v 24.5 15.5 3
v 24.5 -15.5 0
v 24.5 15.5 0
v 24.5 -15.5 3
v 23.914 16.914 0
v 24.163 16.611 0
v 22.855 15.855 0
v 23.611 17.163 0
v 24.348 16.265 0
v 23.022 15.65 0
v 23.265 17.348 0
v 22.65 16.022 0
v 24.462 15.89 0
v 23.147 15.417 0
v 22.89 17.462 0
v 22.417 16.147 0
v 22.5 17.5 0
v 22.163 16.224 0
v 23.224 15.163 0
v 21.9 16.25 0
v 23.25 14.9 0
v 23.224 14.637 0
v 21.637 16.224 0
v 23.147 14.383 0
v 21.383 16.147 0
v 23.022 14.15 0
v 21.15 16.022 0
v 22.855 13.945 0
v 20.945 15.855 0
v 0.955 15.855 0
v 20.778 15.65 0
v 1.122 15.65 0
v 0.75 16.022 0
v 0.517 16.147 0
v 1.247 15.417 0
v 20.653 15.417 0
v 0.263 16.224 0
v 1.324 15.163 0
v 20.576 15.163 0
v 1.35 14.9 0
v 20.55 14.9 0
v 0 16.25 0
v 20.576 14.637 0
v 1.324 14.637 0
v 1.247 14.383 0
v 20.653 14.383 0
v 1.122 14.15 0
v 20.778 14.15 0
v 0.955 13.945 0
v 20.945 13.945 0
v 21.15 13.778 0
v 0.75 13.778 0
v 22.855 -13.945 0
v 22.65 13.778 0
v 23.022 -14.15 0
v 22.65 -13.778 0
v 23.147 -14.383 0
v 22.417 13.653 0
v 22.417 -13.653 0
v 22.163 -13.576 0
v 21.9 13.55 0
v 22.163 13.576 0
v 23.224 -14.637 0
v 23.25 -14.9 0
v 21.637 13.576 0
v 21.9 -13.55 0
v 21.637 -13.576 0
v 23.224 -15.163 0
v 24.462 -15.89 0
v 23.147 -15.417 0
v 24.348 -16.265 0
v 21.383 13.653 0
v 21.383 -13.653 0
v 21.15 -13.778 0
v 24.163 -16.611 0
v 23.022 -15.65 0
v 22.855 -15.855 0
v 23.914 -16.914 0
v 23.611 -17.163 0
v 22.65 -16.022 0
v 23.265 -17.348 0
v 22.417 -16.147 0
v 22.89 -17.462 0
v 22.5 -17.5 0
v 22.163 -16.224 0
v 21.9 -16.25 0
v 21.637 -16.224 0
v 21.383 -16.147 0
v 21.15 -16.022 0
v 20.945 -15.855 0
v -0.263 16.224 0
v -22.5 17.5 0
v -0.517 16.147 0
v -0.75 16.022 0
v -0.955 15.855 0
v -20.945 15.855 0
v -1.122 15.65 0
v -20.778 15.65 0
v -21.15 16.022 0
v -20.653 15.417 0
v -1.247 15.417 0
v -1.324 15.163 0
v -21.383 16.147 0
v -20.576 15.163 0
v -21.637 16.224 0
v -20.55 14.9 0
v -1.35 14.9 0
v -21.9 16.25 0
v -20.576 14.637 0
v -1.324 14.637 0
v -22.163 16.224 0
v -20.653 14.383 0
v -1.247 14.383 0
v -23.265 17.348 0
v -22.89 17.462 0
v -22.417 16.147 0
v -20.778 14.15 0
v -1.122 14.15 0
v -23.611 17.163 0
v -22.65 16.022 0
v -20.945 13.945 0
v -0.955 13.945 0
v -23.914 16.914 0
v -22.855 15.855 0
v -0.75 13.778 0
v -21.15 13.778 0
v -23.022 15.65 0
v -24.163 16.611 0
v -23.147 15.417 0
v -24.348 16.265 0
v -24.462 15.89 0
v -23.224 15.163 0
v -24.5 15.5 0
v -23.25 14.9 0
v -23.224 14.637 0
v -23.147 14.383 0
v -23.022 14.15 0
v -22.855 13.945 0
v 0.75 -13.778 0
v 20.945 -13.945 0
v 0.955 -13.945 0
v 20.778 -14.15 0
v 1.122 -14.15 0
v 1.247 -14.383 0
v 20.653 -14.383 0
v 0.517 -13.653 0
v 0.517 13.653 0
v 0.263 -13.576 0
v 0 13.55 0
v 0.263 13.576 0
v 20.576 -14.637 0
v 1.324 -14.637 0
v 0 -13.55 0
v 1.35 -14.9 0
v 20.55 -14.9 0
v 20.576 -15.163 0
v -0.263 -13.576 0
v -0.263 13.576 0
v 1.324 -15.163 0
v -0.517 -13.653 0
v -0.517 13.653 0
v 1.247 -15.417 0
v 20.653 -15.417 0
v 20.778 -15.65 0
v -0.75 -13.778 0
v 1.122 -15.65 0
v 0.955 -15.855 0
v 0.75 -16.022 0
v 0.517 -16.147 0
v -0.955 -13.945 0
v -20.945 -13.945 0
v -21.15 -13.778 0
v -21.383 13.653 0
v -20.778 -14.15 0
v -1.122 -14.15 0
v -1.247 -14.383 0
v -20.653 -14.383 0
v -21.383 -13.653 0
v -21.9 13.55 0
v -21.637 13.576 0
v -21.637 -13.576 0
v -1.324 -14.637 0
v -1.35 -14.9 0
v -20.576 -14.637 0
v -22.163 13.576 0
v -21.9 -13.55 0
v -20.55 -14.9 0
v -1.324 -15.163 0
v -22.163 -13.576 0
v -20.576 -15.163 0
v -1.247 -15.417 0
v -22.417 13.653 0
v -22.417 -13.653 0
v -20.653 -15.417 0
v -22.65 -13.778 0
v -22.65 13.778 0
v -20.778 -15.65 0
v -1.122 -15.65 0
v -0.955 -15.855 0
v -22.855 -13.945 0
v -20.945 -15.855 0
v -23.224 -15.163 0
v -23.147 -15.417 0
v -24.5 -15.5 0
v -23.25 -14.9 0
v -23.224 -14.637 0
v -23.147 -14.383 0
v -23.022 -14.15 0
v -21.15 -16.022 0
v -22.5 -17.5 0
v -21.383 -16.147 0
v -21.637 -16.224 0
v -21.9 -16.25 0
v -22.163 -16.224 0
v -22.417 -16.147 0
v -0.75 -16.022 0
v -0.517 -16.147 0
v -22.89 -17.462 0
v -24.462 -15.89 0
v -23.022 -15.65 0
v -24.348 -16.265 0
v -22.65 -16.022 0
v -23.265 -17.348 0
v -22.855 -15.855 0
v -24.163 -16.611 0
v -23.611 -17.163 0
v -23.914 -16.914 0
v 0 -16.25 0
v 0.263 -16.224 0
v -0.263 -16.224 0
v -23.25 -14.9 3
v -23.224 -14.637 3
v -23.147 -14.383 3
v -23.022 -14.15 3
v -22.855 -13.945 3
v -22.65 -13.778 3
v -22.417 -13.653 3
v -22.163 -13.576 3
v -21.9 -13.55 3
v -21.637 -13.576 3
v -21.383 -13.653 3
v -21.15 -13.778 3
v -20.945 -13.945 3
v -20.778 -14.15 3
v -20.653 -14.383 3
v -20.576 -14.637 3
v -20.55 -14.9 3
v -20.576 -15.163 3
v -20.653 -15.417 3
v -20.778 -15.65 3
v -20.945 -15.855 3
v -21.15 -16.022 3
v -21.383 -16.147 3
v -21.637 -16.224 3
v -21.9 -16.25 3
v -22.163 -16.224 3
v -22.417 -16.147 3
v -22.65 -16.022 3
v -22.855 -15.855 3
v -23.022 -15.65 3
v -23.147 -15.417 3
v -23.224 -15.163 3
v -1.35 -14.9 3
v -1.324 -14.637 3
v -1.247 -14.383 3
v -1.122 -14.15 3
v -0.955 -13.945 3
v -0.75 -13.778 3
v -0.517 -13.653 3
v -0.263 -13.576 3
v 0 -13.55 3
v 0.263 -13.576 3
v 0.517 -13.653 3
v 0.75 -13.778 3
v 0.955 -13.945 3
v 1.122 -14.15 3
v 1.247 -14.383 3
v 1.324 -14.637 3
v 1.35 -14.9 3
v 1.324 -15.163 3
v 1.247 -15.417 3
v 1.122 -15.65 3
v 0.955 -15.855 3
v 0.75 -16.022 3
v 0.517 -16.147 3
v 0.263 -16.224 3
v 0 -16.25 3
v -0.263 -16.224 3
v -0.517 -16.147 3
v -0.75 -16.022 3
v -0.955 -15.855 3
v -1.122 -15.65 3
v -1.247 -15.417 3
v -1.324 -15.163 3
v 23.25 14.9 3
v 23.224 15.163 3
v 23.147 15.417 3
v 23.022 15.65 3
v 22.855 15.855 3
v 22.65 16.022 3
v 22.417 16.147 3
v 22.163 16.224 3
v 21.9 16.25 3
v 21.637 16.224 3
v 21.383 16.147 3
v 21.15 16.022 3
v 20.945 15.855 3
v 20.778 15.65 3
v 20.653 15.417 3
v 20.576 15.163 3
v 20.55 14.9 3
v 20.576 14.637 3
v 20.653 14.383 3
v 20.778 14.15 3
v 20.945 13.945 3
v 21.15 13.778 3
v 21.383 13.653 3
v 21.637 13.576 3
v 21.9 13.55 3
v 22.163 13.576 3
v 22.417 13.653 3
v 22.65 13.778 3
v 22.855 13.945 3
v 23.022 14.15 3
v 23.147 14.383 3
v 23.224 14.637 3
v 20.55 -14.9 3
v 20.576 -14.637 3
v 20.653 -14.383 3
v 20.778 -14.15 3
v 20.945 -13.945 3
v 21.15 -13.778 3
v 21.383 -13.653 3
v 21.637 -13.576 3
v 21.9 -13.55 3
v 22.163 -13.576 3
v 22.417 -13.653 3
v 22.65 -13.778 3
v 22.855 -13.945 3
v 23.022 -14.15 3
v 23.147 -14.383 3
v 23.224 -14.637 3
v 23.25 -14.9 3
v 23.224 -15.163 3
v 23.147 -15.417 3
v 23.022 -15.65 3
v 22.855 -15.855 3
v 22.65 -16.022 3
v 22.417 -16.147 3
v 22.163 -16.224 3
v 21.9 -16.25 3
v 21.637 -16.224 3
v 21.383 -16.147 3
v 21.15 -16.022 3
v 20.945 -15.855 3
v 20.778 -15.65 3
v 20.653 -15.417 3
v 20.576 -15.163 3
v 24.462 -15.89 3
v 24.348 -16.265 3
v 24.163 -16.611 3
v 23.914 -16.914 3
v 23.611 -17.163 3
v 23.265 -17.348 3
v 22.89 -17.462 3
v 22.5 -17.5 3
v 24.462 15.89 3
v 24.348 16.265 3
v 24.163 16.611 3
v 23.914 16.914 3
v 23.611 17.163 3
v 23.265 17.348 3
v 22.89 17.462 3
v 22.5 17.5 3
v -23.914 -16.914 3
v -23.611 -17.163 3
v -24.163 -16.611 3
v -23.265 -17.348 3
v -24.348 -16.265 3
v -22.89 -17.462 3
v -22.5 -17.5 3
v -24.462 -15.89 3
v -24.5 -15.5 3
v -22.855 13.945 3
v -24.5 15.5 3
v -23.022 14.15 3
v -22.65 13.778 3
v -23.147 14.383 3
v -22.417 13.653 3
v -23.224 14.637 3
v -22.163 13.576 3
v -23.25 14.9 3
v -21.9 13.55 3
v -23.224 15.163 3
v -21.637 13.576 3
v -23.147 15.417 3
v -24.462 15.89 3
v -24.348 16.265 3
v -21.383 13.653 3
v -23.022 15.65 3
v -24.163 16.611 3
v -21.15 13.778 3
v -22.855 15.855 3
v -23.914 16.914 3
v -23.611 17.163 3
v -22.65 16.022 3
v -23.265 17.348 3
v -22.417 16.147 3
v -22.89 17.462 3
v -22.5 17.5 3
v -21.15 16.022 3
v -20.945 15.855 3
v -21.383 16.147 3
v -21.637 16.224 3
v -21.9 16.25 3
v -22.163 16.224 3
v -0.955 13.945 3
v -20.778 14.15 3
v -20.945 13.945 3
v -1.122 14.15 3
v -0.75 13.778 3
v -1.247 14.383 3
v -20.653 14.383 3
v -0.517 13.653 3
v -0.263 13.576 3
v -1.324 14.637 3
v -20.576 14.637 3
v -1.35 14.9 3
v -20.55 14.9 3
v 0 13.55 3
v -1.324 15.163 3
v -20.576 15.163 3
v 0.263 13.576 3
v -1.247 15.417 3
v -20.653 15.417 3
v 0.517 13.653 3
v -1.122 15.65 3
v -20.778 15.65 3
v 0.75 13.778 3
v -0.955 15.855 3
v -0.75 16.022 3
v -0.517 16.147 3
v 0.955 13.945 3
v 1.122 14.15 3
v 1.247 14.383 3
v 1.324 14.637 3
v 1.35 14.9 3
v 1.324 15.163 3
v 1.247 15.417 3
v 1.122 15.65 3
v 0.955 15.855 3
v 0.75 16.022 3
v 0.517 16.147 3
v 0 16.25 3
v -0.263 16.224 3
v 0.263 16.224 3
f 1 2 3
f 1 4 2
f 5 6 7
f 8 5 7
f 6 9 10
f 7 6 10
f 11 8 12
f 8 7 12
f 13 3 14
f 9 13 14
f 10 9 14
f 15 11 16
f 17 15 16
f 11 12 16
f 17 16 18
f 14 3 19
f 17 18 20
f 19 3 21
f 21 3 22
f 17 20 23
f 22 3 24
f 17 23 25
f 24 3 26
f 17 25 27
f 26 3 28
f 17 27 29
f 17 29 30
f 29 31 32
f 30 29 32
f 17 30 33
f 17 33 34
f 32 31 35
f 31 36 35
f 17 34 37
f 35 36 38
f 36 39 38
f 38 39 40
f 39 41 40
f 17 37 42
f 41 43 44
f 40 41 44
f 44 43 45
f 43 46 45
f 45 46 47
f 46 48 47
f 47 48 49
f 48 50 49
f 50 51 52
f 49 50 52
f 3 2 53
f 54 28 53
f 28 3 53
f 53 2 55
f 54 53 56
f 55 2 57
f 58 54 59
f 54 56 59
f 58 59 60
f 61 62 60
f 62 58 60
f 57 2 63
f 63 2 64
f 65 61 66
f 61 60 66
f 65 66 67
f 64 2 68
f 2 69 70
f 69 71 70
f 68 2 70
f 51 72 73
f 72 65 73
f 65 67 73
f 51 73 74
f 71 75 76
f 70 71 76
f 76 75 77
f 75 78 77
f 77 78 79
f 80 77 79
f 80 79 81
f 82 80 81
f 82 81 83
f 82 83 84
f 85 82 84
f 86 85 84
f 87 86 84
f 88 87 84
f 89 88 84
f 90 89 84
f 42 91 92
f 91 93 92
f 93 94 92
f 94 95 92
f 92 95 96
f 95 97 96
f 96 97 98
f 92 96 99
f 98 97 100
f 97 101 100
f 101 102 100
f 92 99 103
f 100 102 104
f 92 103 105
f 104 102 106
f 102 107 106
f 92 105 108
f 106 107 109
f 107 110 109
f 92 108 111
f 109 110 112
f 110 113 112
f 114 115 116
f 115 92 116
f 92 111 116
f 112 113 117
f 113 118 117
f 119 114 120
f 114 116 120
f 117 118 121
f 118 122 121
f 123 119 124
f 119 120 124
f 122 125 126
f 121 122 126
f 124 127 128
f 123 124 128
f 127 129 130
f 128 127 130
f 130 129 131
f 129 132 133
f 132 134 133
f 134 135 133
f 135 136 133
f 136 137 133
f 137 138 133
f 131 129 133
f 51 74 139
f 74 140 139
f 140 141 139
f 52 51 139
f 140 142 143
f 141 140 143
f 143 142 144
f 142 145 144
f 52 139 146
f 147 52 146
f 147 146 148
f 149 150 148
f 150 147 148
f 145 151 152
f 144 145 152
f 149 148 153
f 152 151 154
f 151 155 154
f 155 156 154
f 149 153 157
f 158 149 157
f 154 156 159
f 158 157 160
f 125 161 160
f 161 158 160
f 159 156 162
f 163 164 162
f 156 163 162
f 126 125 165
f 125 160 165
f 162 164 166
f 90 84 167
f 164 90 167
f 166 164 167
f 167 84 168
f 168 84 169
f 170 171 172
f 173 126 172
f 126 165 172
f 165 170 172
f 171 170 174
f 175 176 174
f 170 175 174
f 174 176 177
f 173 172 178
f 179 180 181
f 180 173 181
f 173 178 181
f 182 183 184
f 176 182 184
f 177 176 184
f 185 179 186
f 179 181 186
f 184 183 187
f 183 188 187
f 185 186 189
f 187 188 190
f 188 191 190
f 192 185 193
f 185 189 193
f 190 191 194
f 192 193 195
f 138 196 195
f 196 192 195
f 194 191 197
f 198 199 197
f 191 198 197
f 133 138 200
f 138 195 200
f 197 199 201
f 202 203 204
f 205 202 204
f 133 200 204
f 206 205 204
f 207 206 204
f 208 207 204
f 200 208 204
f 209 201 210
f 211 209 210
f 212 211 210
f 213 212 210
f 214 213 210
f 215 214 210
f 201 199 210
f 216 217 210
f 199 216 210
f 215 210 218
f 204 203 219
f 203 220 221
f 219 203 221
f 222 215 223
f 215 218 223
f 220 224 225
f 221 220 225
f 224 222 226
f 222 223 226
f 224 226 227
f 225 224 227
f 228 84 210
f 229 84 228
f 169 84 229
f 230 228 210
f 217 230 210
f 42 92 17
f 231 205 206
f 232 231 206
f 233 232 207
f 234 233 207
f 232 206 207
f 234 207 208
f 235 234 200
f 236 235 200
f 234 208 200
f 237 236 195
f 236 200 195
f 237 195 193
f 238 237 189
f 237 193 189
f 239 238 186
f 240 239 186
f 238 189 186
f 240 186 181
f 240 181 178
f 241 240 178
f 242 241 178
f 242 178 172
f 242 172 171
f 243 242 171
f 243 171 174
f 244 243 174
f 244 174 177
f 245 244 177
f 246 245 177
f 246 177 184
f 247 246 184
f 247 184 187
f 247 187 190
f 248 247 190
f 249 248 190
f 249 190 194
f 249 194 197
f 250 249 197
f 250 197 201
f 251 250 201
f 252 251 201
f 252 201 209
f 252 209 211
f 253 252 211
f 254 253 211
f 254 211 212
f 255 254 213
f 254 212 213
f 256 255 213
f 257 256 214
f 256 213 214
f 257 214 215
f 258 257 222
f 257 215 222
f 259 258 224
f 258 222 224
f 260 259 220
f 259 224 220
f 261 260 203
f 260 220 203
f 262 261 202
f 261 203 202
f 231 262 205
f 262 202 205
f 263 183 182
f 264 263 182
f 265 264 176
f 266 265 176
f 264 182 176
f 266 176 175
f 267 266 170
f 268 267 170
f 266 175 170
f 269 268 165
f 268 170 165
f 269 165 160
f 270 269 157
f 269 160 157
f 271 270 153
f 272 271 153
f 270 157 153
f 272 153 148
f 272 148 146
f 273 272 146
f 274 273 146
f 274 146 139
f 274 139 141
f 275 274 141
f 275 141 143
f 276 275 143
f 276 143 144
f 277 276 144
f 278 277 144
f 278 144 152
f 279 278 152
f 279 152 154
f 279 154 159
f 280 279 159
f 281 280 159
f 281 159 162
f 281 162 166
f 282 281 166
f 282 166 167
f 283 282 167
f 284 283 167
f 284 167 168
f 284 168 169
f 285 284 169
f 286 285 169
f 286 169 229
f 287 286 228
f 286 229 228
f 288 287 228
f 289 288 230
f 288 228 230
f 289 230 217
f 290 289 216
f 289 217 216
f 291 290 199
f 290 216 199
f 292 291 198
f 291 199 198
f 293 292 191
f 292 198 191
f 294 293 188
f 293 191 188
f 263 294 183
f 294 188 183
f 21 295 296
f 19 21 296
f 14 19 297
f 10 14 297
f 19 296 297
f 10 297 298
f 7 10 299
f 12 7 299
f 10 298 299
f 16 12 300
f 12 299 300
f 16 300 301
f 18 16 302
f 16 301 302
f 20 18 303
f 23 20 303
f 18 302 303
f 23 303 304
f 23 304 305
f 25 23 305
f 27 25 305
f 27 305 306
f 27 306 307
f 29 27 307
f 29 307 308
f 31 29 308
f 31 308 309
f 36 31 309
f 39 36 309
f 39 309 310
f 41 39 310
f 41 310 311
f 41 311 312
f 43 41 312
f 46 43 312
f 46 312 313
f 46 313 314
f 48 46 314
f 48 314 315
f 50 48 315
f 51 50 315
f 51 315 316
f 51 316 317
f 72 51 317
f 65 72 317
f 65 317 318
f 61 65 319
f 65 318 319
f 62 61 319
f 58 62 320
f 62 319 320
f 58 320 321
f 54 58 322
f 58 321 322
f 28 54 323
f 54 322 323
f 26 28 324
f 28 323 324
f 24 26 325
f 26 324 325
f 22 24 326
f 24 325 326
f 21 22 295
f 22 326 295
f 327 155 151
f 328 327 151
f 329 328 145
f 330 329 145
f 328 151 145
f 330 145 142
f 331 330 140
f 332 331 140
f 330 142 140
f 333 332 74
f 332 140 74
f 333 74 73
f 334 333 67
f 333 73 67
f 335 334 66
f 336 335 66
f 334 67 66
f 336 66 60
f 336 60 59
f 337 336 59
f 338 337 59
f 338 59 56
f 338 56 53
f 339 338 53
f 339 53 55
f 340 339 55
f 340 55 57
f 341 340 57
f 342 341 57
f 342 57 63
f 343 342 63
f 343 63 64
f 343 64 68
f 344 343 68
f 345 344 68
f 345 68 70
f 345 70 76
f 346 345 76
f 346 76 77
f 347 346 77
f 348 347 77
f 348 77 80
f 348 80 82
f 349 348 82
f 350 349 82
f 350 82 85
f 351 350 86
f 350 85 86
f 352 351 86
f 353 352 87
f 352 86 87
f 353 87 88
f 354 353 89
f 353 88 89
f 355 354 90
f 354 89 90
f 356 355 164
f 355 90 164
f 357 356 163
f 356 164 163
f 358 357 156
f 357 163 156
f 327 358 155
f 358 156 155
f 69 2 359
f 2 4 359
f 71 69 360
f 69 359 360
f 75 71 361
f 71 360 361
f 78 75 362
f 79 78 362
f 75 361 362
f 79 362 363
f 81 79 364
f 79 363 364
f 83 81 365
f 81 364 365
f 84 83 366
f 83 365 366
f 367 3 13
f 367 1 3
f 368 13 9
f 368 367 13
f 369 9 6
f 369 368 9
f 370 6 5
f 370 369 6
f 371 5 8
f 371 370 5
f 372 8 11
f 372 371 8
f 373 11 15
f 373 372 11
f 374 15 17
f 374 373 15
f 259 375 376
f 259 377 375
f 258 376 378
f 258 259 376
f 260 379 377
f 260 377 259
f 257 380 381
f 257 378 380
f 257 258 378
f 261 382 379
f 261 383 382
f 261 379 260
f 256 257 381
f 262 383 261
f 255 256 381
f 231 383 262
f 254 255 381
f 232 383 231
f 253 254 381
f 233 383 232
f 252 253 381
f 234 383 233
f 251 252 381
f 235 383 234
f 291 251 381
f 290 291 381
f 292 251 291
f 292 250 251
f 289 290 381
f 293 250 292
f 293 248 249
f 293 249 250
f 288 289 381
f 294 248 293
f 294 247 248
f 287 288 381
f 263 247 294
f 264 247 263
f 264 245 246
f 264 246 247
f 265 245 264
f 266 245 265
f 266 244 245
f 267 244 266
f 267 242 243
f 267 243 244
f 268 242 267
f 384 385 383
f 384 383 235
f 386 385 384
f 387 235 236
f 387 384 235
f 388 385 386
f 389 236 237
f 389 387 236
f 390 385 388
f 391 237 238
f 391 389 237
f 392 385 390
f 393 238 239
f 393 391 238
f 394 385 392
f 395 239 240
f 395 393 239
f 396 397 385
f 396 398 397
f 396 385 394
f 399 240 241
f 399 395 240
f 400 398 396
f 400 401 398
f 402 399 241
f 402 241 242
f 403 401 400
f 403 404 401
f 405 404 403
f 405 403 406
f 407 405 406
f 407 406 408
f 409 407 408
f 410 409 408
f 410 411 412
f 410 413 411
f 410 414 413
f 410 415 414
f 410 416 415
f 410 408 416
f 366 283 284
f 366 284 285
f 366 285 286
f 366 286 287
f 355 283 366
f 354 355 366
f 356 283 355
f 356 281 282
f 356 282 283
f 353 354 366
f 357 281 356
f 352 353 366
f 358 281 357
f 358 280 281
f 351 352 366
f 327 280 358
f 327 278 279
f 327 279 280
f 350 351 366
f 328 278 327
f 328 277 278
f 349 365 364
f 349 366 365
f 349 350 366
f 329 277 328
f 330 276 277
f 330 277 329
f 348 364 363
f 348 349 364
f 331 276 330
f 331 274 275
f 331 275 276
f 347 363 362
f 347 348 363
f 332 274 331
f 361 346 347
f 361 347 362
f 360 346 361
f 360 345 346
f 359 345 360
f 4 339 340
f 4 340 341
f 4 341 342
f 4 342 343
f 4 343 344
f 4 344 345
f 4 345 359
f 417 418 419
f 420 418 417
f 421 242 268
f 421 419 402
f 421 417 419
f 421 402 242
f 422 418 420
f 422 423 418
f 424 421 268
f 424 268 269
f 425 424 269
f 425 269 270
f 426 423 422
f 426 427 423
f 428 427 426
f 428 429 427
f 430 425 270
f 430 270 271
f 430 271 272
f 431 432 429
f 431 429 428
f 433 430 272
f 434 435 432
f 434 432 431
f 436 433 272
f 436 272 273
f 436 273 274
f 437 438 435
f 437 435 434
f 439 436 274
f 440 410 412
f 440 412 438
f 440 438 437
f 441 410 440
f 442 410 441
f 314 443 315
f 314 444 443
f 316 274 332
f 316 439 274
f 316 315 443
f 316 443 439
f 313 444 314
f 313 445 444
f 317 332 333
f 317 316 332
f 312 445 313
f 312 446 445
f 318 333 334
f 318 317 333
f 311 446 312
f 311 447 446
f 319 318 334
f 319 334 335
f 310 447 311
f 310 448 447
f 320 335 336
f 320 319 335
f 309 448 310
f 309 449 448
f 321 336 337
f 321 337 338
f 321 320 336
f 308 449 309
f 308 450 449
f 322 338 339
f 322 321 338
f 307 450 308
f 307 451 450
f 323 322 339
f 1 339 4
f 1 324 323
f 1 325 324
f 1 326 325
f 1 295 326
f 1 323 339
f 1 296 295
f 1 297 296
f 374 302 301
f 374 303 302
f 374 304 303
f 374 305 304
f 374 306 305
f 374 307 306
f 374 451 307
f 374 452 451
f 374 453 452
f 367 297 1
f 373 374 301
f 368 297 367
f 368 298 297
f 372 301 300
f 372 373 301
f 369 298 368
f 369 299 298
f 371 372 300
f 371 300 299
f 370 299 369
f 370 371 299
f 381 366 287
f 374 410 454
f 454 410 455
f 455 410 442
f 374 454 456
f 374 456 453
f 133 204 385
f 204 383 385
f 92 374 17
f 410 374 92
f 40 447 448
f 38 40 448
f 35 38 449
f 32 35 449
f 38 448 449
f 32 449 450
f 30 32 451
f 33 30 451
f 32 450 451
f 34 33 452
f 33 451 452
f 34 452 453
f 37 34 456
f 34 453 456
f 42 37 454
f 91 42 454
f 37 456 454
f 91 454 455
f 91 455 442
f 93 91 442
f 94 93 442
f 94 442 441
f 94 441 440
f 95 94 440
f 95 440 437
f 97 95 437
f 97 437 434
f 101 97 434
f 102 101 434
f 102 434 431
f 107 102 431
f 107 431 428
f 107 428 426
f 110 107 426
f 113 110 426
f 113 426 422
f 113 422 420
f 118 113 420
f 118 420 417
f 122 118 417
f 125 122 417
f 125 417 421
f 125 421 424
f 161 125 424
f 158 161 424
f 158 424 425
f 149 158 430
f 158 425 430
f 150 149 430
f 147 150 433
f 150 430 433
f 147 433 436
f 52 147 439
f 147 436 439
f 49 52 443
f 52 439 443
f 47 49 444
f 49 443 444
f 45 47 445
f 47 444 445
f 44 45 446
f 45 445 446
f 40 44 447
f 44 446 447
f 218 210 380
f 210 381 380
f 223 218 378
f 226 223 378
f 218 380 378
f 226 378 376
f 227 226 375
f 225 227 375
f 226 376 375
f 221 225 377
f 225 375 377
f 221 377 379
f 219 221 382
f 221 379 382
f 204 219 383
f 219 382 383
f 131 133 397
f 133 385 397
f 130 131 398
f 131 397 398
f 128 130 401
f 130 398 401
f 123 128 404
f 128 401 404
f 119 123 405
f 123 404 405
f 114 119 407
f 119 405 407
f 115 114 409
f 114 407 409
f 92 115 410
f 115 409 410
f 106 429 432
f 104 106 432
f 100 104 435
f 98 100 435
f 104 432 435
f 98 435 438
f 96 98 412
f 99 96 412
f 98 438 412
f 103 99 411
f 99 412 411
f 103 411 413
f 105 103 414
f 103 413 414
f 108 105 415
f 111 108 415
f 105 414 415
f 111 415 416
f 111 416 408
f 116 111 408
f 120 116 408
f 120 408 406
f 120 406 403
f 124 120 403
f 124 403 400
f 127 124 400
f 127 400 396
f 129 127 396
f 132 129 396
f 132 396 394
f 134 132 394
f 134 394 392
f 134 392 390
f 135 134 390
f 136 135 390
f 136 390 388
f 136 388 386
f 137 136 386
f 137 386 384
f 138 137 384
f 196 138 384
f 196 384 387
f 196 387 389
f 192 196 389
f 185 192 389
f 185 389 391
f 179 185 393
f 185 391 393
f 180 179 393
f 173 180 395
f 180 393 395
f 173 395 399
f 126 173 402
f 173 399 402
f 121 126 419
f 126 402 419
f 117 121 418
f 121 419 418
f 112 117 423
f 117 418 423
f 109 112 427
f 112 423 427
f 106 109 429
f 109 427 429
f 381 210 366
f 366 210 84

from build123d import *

# Parameters (mm, degrees)
ESBO_O1_W                = 49
ESBO_O1_H                = 35
RESSALTO_EXTRUS_O1_DEPTH = 3
ESBO_O2_R                = 1.35
CORTE_EXTRUS_O1_DEPTH    = 31.257230541
ESBO_O3_W                = 49
ESBO_O3_H                = 3
RESSALTO_EXTRUS_O3_DEPTH = 8
ESBO_O4_R                = 1.35
CORTE_EXTRUS_O2_DEPTH    = 44.465503563
FILETE1_R                = 2
FILETE2_R                = 2
CORTE_EXTRUS_O3_DEPTH    = 10
FILETE3_R                = 2
ESBO_O6_R                = 1.35
CORTE_EXTRUS_O4_DEPTH    = 31.257230541


with BuildPart() as part:
    # Esboço1 → Ressalto-extrusão1 (new body)
    with BuildSketch(Plane.XY):
        Rectangle(ESBO_O1_W, ESBO_O1_H)
    extrude(amount=RESSALTO_EXTRUS_O1_DEPTH)

    # Esboço2 → Corte-extrusão1 (cut, through all)
    with BuildSketch(Plane(origin=(0, 0, 0), x_dir=(-1, 0, 0), z_dir=(0, 0, -1))):
        with Locations((-21.9, -14.9)):
            Circle(ESBO_O2_R)
        with Locations((0, -14.9)):
            Circle(ESBO_O2_R)
        with Locations((21.9, -14.9)):
            Circle(ESBO_O2_R)
    extrude(amount=-CORTE_EXTRUS_O1_DEPTH, mode=Mode.SUBTRACT)

    # Esboço3 → Ressalto-extrusão3 (add)
    with BuildSketch(Plane(origin=(0, 0, 0), x_dir=(-1, 0, 0), z_dir=(0, 0, -1))):
        with Locations((0, 16)):
            Rectangle(ESBO_O3_W, ESBO_O3_H)
    extrude(amount=RESSALTO_EXTRUS_O3_DEPTH)

    # Esboço4 → Corte-extrusão2 (cut, through all)
    with BuildSketch(Plane(origin=(0, 17.5, 0), x_dir=(1, 0, 0), z_dir=(0, 1, 0))):
        with Locations(Location((-21.9, 5.4, 0), (0, 0, 270))):
            Circle(ESBO_O4_R)
        with Locations(Location((0, 5.4, 0), (0, 0, 270))):
            Circle(ESBO_O4_R)
        with Locations(Location((21.9, 5.4, 0), (0, 0, 270))):
            Circle(ESBO_O4_R)
    extrude(amount=-CORTE_EXTRUS_O2_DEPTH, mode=Mode.SUBTRACT)

    # Filete1
    filete1_edges = [part.edges().sort_by_distance(p)[0] for p in [
        (24.5, -17.5, 1.5),
        (-24.5, -17.5, 1.5),
    ]]
    fillet(filete1_edges, radius=FILETE1_R)

    # Filete2
    filete2_edges = [part.edges().sort_by_distance(p)[0] for p in [
        (24.5, 16, -8),
        (-24.5, 16, -8),
    ]]
    fillet(filete2_edges, radius=FILETE2_R)

    # Esboço5 → Corte-extrusão3 (cut)
    with BuildSketch(Plane(origin=(0, 14.5, 0), x_dir=(-1, 0, 0), z_dir=(0, -1, 0))):
        Polygon((24.5, 0), (24.5, 8), (22.5, 8), (-24.5, 8), (-24.5, 0), align=None)
    extrude(amount=-CORTE_EXTRUS_O3_DEPTH, mode=Mode.SUBTRACT)

    # Filete3
    filete3_edges = [part.edges().sort_by_distance(p)[0] for p in [
        (-24.5, 17.5, 1.5),
        (24.5, 17.5, 1.5),
    ]]
    fillet(filete3_edges, radius=FILETE3_R)

    # Esboço6 → Corte-extrusão4 (cut, through all)
    with BuildSketch(Plane.XY.offset(3)):
        with Locations((21.9, 14.9)):
            Circle(ESBO_O6_R)
        with Locations((0, 14.9)):
            Circle(ESBO_O6_R)
        with Locations((-21.9, 14.9)):
            Circle(ESBO_O6_R)
    extrude(amount=-CORTE_EXTRUS_O4_DEPTH, mode=Mode.SUBTRACT)


solid = part.part
